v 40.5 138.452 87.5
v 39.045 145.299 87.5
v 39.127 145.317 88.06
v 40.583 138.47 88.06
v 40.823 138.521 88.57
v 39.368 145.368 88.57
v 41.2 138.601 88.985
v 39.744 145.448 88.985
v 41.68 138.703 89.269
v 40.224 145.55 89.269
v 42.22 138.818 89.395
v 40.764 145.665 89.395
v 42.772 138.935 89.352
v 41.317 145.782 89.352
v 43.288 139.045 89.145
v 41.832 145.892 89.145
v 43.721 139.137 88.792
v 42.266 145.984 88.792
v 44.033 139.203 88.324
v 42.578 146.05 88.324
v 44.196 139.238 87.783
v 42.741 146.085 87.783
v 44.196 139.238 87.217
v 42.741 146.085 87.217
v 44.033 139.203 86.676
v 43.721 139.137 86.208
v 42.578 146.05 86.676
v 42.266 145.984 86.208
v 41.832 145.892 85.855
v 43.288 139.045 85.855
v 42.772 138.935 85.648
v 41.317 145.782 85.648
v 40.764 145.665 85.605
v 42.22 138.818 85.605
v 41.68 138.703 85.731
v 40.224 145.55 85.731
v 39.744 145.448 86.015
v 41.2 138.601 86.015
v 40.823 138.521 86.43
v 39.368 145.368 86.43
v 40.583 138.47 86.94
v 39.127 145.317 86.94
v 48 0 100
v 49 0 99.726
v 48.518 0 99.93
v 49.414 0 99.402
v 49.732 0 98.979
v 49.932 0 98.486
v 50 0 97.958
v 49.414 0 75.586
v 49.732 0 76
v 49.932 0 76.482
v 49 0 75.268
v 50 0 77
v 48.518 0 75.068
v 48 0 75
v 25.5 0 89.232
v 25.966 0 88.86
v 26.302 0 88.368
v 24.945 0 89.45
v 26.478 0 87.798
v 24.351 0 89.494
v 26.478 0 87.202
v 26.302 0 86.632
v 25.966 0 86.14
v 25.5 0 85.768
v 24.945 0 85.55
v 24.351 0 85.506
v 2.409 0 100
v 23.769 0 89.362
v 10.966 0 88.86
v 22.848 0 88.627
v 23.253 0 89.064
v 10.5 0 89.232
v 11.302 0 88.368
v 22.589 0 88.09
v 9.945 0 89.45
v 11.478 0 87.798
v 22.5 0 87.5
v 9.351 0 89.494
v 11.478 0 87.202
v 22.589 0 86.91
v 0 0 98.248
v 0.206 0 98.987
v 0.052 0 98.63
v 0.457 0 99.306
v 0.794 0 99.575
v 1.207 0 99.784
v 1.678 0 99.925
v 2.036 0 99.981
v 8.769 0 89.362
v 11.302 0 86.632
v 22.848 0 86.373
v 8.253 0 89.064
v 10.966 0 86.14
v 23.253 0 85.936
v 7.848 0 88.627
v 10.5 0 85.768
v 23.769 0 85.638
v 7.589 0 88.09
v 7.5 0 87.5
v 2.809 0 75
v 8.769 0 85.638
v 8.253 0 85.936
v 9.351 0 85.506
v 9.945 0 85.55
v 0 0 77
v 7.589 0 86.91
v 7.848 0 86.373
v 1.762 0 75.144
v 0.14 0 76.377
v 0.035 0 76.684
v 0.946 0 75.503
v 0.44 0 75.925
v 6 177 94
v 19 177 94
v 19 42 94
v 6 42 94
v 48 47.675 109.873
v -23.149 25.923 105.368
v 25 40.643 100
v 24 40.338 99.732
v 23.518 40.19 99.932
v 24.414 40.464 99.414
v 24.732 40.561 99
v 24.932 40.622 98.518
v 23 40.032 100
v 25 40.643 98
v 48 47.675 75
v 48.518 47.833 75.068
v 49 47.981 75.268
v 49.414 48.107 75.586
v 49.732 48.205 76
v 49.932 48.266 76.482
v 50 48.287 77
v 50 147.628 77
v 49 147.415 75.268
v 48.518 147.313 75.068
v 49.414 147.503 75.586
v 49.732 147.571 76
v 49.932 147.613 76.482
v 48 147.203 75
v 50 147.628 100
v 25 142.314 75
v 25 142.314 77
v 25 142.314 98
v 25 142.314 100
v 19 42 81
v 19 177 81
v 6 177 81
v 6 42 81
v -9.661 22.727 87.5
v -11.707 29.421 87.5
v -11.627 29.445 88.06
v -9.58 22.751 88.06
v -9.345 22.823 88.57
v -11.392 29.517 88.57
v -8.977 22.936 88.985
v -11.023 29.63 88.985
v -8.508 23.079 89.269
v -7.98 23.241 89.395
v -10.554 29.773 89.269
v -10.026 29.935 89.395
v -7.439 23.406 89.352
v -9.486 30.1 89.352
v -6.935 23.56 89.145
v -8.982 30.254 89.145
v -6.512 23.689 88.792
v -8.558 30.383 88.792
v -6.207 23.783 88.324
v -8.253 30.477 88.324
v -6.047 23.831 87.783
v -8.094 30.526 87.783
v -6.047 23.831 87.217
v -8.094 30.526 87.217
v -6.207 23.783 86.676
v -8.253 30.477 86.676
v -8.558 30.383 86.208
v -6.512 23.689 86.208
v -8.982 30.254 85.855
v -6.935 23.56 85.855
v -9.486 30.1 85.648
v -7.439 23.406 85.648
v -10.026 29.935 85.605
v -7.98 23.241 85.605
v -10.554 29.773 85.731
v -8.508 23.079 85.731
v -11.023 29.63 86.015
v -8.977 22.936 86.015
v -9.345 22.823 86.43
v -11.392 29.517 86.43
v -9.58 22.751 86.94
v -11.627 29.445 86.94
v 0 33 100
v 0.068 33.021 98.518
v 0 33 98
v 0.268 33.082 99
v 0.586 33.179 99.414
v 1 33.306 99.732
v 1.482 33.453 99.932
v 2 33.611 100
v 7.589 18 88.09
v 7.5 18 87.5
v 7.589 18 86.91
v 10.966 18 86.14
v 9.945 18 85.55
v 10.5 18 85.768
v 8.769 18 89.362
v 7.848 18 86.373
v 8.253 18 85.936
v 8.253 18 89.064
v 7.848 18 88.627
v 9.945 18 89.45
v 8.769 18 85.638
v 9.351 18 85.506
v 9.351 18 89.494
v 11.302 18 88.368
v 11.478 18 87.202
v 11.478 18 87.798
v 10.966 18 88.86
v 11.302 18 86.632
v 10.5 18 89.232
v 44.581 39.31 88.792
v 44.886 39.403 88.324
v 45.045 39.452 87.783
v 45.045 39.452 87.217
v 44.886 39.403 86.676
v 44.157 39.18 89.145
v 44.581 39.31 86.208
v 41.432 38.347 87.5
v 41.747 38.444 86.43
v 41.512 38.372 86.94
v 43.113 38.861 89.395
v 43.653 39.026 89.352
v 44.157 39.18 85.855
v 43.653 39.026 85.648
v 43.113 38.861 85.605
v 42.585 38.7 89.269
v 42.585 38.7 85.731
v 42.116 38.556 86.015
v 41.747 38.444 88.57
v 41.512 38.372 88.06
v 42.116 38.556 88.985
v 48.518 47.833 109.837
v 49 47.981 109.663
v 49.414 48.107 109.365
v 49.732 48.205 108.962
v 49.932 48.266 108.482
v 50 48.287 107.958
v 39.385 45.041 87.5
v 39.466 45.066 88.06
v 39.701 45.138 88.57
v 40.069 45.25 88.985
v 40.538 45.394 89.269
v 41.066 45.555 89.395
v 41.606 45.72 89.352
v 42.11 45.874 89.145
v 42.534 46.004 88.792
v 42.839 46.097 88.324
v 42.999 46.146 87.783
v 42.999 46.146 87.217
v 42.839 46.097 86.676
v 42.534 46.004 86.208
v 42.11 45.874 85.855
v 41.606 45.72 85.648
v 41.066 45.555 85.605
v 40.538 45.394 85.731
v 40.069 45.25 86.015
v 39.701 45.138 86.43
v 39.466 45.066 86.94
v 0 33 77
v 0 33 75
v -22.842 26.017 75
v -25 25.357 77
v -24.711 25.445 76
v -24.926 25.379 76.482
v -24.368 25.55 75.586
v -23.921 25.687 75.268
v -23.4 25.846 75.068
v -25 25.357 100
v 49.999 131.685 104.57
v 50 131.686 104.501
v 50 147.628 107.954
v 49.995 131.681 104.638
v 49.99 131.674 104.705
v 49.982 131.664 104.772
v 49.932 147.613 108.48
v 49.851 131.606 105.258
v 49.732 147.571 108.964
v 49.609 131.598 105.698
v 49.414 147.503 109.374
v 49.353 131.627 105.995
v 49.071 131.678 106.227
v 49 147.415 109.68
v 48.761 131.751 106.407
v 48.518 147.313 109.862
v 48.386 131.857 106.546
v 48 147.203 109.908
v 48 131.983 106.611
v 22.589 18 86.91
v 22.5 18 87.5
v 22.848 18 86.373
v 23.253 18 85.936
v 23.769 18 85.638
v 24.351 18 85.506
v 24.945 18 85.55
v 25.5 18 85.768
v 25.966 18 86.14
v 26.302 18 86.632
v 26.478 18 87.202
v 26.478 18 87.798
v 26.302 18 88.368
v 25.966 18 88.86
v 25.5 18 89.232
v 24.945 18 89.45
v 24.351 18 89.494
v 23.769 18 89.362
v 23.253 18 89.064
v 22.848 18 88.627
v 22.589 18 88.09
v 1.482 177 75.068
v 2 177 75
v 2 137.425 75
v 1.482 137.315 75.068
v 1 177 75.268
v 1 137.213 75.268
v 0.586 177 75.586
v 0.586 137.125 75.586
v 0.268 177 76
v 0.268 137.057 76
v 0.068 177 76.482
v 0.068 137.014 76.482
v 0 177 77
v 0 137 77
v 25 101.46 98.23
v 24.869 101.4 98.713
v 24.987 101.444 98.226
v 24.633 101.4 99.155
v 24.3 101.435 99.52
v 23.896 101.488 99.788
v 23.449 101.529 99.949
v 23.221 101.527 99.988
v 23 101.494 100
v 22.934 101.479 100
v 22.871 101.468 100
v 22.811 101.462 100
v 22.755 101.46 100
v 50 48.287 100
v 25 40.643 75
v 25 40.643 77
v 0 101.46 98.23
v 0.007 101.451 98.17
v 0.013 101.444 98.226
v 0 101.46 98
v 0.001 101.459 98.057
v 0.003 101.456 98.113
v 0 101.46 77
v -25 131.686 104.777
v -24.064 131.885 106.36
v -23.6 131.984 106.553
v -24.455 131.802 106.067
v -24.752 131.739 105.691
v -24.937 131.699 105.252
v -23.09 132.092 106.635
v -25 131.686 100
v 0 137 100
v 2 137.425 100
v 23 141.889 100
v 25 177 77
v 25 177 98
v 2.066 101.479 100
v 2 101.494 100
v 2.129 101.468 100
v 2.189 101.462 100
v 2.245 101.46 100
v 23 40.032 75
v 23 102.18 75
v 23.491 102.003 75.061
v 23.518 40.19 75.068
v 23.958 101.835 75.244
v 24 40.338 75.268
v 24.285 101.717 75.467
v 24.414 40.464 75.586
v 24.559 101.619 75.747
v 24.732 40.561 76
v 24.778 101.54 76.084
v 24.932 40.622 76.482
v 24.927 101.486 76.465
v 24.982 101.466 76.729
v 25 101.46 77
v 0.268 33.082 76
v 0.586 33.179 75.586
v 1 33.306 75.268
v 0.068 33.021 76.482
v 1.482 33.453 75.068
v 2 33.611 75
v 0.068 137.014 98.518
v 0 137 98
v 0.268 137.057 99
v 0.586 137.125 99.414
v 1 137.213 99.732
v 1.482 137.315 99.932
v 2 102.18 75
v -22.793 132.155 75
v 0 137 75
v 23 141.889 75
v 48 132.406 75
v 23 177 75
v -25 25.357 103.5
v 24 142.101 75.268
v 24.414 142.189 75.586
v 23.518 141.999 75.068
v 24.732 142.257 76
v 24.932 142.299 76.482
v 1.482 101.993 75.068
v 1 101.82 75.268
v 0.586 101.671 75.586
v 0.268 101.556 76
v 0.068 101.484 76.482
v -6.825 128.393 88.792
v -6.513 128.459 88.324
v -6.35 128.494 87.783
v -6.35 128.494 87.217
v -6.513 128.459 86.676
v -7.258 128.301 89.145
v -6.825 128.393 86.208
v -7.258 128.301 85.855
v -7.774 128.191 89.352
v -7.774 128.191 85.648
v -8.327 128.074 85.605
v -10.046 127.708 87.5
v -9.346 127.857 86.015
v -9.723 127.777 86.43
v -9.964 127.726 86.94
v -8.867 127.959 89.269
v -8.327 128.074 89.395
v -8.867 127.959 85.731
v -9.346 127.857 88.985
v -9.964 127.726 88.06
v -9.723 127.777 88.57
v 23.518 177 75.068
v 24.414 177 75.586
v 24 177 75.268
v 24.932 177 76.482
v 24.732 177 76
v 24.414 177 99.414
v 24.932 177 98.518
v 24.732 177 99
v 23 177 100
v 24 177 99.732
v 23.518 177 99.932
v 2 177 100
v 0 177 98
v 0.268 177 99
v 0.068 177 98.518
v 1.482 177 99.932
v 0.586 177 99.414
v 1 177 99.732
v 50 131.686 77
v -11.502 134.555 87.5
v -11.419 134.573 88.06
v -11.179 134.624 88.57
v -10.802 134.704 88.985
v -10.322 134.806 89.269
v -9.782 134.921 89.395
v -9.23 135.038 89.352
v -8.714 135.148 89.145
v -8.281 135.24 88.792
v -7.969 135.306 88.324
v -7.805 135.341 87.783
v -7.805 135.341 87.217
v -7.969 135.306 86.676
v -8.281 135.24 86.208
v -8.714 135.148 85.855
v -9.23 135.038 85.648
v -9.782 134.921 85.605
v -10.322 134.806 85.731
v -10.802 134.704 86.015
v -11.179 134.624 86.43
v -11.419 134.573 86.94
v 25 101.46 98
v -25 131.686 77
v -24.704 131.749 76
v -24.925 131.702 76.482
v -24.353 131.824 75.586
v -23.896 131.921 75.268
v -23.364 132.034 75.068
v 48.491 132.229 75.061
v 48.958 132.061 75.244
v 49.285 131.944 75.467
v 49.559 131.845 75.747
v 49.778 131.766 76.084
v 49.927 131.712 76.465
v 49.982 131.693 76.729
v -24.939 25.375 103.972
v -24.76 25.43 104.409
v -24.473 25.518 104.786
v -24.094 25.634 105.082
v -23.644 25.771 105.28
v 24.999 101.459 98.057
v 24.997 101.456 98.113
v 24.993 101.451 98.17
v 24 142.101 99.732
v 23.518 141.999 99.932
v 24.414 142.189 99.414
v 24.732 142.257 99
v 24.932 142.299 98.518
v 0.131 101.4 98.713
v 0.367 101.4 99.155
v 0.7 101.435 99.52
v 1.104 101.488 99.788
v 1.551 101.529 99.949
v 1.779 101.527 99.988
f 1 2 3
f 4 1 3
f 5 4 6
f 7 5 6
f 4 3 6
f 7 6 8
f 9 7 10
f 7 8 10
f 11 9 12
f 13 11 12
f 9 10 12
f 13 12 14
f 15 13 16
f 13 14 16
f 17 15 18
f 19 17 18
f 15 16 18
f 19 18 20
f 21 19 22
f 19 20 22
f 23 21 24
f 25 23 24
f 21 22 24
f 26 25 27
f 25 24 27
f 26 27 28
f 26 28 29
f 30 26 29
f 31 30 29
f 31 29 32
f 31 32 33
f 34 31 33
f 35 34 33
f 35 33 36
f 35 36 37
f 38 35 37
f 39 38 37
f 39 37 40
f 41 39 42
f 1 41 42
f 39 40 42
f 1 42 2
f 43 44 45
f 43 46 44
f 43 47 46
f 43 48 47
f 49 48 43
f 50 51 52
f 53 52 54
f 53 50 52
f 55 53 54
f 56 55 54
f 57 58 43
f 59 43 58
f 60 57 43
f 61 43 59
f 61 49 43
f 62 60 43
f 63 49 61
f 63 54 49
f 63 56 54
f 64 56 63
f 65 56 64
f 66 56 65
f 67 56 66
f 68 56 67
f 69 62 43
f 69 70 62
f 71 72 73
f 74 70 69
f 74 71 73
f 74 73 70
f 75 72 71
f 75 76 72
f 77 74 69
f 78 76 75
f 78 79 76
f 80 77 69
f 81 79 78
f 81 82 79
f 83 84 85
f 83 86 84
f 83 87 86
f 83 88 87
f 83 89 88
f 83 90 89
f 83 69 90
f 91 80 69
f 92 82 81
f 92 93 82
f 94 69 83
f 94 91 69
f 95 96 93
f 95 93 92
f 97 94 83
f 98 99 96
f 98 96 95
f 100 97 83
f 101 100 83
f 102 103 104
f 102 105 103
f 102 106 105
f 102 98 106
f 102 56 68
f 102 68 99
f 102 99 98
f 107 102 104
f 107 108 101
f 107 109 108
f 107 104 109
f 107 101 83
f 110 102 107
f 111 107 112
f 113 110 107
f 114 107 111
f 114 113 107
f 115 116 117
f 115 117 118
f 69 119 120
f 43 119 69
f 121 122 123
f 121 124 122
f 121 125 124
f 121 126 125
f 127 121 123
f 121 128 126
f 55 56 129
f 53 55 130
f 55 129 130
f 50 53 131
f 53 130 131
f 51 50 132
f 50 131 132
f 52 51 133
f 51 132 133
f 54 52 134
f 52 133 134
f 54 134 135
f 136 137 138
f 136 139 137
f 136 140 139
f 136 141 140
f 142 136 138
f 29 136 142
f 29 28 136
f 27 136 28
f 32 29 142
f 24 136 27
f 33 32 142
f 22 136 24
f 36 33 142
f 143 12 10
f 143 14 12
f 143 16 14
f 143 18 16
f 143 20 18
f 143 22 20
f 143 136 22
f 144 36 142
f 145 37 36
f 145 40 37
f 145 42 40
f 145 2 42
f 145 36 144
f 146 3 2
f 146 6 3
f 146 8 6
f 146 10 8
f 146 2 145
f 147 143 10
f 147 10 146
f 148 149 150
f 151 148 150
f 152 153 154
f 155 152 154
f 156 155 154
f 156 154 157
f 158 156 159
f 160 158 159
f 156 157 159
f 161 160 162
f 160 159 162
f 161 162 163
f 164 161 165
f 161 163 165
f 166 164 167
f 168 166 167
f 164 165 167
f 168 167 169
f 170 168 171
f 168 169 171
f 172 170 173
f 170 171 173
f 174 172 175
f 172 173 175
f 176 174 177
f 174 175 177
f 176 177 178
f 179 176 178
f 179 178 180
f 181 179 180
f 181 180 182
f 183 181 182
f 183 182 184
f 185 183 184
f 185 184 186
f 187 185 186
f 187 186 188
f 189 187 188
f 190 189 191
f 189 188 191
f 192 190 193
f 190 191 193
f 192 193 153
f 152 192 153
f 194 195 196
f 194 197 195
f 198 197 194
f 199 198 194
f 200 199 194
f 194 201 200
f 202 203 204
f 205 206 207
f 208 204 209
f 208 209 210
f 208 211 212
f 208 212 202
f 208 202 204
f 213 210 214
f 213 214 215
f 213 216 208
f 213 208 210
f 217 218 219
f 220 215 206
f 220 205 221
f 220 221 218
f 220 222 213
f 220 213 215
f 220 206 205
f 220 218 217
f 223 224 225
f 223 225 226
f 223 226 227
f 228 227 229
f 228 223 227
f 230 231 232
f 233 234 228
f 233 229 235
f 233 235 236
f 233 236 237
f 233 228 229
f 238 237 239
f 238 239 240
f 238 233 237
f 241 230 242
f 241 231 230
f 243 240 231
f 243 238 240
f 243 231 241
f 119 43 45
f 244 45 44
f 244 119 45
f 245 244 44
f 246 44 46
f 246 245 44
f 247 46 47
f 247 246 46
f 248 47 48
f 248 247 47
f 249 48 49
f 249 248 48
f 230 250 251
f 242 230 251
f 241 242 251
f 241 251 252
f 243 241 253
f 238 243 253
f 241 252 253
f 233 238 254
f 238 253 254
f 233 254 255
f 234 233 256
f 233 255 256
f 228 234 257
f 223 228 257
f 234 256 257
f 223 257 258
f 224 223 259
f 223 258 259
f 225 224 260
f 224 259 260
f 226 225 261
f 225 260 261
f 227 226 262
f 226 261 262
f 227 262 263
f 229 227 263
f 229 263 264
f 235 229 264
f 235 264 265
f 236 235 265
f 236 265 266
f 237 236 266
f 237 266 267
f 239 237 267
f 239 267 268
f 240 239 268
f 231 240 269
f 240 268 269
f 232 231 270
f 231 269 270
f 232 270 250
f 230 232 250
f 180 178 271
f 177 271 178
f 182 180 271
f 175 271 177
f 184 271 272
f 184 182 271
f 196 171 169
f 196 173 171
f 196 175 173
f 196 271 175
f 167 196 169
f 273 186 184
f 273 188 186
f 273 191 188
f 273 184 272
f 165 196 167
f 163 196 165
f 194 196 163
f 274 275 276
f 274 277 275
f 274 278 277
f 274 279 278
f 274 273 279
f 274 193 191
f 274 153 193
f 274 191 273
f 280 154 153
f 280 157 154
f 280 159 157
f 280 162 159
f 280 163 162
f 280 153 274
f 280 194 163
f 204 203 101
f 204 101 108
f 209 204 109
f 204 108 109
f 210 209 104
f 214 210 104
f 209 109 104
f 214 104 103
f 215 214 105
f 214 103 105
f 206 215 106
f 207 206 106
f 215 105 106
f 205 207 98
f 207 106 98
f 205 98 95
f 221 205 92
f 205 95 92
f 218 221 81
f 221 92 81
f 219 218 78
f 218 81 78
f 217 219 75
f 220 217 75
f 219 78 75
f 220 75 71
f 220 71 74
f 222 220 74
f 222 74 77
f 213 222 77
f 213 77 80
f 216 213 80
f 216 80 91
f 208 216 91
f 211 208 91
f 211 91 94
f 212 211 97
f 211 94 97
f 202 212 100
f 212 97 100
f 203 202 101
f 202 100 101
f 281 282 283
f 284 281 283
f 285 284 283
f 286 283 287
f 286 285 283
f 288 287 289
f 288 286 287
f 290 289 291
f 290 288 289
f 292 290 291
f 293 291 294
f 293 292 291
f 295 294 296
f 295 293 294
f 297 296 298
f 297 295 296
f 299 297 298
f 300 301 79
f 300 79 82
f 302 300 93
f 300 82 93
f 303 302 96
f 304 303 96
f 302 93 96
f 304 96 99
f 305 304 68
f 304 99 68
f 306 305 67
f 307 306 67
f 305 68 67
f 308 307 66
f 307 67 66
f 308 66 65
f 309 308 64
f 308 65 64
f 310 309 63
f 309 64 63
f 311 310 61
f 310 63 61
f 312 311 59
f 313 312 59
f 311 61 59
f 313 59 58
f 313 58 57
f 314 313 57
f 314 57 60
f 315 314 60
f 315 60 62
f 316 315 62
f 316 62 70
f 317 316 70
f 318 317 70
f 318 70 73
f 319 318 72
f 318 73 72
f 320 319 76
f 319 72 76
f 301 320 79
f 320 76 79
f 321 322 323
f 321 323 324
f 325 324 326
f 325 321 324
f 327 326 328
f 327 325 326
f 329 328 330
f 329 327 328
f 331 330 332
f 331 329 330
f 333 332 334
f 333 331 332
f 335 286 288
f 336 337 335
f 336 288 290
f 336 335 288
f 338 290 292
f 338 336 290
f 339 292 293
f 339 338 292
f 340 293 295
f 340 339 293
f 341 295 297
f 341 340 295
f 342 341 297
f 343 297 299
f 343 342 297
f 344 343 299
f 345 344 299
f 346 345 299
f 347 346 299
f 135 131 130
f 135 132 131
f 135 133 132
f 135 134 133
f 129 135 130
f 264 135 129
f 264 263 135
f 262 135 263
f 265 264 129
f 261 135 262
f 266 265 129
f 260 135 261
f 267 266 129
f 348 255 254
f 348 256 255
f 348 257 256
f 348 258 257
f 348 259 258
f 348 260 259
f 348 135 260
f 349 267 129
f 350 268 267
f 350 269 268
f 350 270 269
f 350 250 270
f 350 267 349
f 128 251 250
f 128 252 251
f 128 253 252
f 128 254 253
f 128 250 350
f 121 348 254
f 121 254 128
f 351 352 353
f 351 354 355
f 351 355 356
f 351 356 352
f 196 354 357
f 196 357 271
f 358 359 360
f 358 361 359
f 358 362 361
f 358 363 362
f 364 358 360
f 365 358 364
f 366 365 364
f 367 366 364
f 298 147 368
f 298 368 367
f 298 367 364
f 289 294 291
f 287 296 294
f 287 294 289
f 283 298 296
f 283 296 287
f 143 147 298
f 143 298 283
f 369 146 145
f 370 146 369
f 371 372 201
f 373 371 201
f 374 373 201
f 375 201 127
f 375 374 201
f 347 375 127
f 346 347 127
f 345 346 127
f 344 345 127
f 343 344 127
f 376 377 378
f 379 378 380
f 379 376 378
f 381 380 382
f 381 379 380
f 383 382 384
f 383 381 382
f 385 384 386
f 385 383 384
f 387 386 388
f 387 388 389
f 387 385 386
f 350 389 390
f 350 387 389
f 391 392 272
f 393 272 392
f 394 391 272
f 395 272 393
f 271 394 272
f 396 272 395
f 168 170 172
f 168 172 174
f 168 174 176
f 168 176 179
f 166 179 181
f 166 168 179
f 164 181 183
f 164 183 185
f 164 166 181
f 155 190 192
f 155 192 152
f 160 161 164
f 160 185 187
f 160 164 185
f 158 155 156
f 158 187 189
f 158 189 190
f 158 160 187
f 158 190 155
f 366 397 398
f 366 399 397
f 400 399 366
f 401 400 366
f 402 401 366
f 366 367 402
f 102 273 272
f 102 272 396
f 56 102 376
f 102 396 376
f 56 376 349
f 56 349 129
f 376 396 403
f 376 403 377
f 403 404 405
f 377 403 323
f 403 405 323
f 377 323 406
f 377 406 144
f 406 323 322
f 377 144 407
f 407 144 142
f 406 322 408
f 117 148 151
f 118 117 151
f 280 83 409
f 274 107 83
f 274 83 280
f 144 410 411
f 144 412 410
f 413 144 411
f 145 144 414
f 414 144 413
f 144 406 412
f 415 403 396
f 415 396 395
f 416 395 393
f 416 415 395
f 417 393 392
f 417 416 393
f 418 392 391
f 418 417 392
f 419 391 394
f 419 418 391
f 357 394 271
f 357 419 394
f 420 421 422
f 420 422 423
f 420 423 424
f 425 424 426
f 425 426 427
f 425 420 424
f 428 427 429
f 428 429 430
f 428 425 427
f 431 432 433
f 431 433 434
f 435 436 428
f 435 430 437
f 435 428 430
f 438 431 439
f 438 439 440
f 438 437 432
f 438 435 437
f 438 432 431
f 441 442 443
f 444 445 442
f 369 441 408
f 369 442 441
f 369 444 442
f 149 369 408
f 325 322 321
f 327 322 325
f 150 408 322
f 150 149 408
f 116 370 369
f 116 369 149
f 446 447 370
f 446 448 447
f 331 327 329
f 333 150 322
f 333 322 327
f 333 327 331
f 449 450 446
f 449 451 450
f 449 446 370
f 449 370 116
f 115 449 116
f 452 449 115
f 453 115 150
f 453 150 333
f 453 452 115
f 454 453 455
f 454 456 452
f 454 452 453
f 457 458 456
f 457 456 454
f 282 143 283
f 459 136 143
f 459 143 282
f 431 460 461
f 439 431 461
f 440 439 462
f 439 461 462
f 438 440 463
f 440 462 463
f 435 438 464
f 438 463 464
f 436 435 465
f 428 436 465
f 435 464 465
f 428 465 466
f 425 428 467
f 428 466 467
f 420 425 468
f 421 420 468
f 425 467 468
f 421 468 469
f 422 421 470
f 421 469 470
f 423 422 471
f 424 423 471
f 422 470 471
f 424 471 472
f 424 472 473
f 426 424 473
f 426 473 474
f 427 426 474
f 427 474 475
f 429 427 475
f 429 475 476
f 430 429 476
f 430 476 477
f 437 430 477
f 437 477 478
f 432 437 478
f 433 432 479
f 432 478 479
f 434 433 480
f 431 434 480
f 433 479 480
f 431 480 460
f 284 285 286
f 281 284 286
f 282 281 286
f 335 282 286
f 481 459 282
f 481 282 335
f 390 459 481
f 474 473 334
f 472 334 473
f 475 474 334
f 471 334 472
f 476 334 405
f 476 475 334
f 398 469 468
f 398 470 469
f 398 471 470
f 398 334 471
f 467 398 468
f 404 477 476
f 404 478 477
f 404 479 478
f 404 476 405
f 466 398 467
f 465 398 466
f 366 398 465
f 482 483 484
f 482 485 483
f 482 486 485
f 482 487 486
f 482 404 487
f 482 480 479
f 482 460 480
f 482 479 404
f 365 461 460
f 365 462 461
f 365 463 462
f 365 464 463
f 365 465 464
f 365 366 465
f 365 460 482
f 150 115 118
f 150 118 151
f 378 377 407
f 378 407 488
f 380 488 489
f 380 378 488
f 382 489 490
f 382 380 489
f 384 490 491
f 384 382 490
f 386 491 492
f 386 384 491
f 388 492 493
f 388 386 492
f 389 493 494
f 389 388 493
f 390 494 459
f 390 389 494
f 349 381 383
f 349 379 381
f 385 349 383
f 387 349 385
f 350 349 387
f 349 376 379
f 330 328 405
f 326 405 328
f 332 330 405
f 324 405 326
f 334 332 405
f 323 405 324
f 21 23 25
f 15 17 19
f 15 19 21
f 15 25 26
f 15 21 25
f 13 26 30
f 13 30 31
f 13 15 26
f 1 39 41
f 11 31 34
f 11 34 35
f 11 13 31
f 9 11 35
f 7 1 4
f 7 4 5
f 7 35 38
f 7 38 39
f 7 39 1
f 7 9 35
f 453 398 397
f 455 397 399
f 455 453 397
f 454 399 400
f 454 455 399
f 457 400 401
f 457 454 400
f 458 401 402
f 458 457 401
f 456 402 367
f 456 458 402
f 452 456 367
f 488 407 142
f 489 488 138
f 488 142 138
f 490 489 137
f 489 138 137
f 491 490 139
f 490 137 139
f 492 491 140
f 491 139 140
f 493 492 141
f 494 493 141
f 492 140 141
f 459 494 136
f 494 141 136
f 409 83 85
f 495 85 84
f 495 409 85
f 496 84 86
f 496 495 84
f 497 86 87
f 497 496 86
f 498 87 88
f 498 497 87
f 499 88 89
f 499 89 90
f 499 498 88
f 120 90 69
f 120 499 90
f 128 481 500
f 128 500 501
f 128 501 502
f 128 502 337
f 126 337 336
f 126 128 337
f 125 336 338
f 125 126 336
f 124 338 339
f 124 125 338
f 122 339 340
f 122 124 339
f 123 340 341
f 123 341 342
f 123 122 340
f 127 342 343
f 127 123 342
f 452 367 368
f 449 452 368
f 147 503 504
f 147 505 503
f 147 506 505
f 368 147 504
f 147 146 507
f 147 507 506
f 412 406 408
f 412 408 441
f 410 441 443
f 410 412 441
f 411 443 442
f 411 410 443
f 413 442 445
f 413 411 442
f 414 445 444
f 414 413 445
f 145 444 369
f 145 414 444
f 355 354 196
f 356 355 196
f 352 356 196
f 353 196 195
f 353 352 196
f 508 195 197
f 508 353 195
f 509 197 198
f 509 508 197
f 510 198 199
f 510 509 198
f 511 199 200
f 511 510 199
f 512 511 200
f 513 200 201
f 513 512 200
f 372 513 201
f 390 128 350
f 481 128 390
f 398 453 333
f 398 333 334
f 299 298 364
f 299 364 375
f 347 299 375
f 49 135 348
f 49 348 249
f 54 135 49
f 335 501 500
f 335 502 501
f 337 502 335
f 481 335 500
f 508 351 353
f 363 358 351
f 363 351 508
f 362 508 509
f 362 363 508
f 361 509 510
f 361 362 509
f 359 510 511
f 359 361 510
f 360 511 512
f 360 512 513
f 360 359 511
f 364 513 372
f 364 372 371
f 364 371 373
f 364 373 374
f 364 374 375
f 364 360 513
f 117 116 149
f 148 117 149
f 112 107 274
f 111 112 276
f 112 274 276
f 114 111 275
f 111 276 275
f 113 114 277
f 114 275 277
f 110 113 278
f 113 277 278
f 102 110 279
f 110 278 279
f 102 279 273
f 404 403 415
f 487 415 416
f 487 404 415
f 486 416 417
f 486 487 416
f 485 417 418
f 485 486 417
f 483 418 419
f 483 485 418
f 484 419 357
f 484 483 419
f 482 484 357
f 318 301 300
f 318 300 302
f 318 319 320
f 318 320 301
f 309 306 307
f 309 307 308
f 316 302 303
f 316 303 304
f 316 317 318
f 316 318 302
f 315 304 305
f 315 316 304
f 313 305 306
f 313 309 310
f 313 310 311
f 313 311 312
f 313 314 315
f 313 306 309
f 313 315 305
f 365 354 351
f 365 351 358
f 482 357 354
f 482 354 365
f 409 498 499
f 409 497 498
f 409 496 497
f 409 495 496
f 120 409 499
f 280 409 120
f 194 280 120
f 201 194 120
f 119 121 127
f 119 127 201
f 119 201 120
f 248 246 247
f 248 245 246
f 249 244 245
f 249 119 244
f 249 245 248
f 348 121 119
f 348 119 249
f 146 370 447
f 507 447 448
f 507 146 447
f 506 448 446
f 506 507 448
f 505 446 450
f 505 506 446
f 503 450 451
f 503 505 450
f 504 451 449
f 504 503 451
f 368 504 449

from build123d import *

# Parameters (mm, degrees)
F0_W           = 25
F0_H           = 33
F1_DEPTH       = 25
F3_DEPTH       = 10
F5_DEPTH       = 81.7
F7_DEPTH       = 10
F9_DEPTH       = 92
F10_W          = 13
F10_H          = 13
F11_DEPTH      = 135
F14_W          = 99.2073006928
F14_H          = 199.154949747
F15_DEPTH      = 88
F16_R          = 1.9
F17_DEPTH      = 7
F18_R          = 1.9
F19_DEPTH      = 7
F21_DEPTH      = 18
F22_T1_DEPTH   = 58.2865340729
F22_T3_DEPTH   = 59.3111485648
F22_T5_DEPTH   = 45.6084808239
F22_T7_DEPTH   = 44.6581070284
F22_T9_DEPTH   = 26.3114146799
F22_T11_DEPTH  = 25.9417421253
F22_T16_DEPTH  = 70.8165659944
F22_T23_DEPTH  = 70.8165659944
F22_T29_DEPTH  = 70.8165659944
F22_T35_DEPTH  = 78.4598330308
F22_T41_DEPTH  = 78.4598330308
F22_T47_DEPTH  = 78.4598330308
F22_T54_DEPTH  = 70.8165659944
F22_T60_DEPTH  = 78.4598330308
F22_T66_DEPTH  = 49.2253281189
F22_T71_DEPTH  = 48.4985768834
F22_T77_DEPTH  = 48.4985768834
F22_T83_DEPTH  = 48.4985768834
F22_T89_DEPTH  = 49.2253281189
F22_T94_DEPTH  = 48.4985768834
F22_T100_DEPTH = 48.4985768834
F22_T106_DEPTH = 48.4985768834
F22_T112_DEPTH = 44.6860859582
F22_T117_DEPTH = 50
F22_T122_DEPTH = 44.6860859582
F22_T127_DEPTH = 50
F22_T133_DEPTH = 70.8165659944
F22_T138_DEPTH = 48.4985768834
F22_T146_DEPTH = 48.4985768834
F22_T151_DEPTH = 78.4598330308
F22_T159_DEPTH = 70.8165659944
F22_T163_DEPTH = 49.2253281189
F22_T170_DEPTH = 49.2253281189
F22_T174_DEPTH = 78.4598330308


# Not quite as in the source:
# - a fillet or chamfer that OpenCascade refuses, or shapes differently, is made with other operations: its cross-section is extruded or revolved along the edge and cut away or added


with BuildPart() as f1:
    # F0 (on Top) → F1 (new body)
    with BuildSketch(Plane.XY):
        with Locations((12.5, 16.5)):
            Rectangle(F0_W, F0_H)
        Polygon((-25, 25.3567329635), (0, 0), (0, 33), align=None)
        with Locations((37.5, 16.5)):
            Rectangle(F0_W, F0_H)
        Polygon((25, 40.6432670365), (0, 33), (25, 33), align=None)
        Polygon((0, 101.4598330308), (0, 33), (25, 40.6432670365), (25, 101.4598330308), (25, 137), (0, 137), align=None)
        Polygon((25, 40.6432670365), (25, 33), (50, 33), (50, 48.2865340729), align=None)
        Polygon((-25, 131.6860859582), (0, 101.4598330308), (0, 137), align=None)
        Polygon((25, 137), (25, 101.4598330308), (50, 131.6860859582), (50, 147.6278280835), (25, 142.3139140418), align=None)
        Polygon((25, 142.3139140418), (0, 137), (25, 137), align=None)
        Polygon((0, 177), (0, 137), (25, 142.3139140418), (25, 177), align=None)
    extrude(amount=F1_DEPTH)

    # F2 (on face) → F3 (join)
    with BuildSketch(Plane(origin=(0, 0, 0), x_dir=(1, 0, 0), z_dir=(0, 0, -1))):
        Polygon((50, -131.6860859582), (25, -101.4598330308), (0, -101.4598330308), (-25, -131.6860859582), (50, -147.6278280835), align=None)
    extrude(amount=F3_DEPTH)

    # F4 (on face) → F5 (cut, symmetric)
    with BuildSketch(Plane.YZ.offset(25)):
        Polygon((101.4598330308, -21.1370438337), (147.6278330308, -10), (101.4598330308, 0), align=None)
    extrude(amount=F5_DEPTH, both=True, mode=Mode.SUBTRACT)

    # F6 (on face) → F7 (join)
    with BuildSketch(Plane(origin=(0, 0, 0), x_dir=(1, 0, 0), z_dir=(0, 0, -1))):
        Polygon((50, -48.2865340729), (50, 0), (0, 0), (-25, -25.3567329635), align=None)
    extrude(amount=F7_DEPTH)

    # F8 (on face) → F9 (cut)
    with BuildSketch(Plane.YZ.offset(50)):
        Polygon((48.2865340729, -10), (0, 0), (0, -39.534393698), (48.2865340729, -39.534393698), align=None)
    extrude(amount=-F9_DEPTH, mode=Mode.SUBTRACT)

    # F10 (on face) → F11 (cut)
    with BuildSketch(Plane(origin=(0, 177, 0), x_dir=(-1, 0, 0), z_dir=(0, 1, 0))):
        with Locations((-12.5, 12.5)):
            Rectangle(F10_W, F10_H)
    extrude(amount=-F11_DEPTH, mode=Mode.SUBTRACT)


with BuildPart() as f13_1:
    # F13: instance of F1
    add(f1.part.mirror(Plane(origin=(16.2715907381, 80.4050719696, 50), x_dir=(1, 0, 0), z_dir=(0, 0, 1))))

    # F16 (on face) → F17 (cut)
    with BuildSketch(Plane(origin=(-27.8614600507, 131.0778638485, 0), x_dir=(-0.9781476007, -0.2079116908, 0), z_dir=(-0.2079116908, 0.9781476007, 0))):
        with Locations((-18.6253867704, 87.5)):
            Circle(F16_R)
        with BuildLine():
            ThreePointArc((-72.2009313853, 87.5), (-70.3009313853, 85.6), (-68.4009313853, 87.5))
            ThreePointArc((-68.4009313853, 87.5), (-70.3009313853, 89.4), (-72.2009313853, 87.5))
        make_face()
    extrude(amount=-F17_DEPTH, mode=Mode.SUBTRACT)

    # F18 (on face) → F19 (cut)
    with BuildSketch(Plane(origin=(-9.2266829073, 30.1791199472, 0), x_dir=(-0.956304756, -0.2923717047, 0), z_dir=(-0.2923717047, 0.956304756, 0))):
        with Locations((0.6940276563, 87.5)):
            Circle(F18_R)
        with BuildLine():
            ThreePointArc((-54.6328540802, 87.5), (-52.7328540802, 85.6), (-50.8328540802, 87.5))
            ThreePointArc((-50.8328540802, 87.5), (-52.7328540802, 89.4), (-54.6328540802, 87.5))
        make_face()
    extrude(amount=-F19_DEPTH, mode=Mode.SUBTRACT)

    # F20 (on face) → F21 (cut)
    with BuildSketch(Plane.XZ):
        with BuildLine():
            ThreePointArc((11.5, 87.5), (9.5, 89.5), (7.5, 87.5))
            Line((7.5, 87.5), (9.5, 87.5))
            Line((9.5, 87.5), (11.5, 87.5))
        make_face()
        with BuildLine():
            ThreePointArc((26.5, 87.5), (24.5, 89.5), (22.5, 87.5))
            ThreePointArc((22.5, 87.5), (24.5, 85.5), (26.5, 87.5))
        make_face()
        with BuildLine():
            Line((9.5, 87.5), (7.5, 87.5))
            ThreePointArc((7.5, 87.5), (9.5, 85.5), (11.5, 87.5))
            Line((11.5, 87.5), (9.5, 87.5))
        make_face()
    extrude(amount=-F21_DEPTH, mode=Mode.SUBTRACT)

    # F22: fillet of radius 2 on 18 edges, made by hand

    # F22_s2 → F22_t1 (cut)
    with BuildSketch(Plane.XZ.offset(-53.2865340729)):
        with BuildLine():
            ThreePointArc((48, 75), (49.4142135624, 75.5857864376), (50, 77))
            Line((50, 77), (50, 75))
            Line((50, 75), (48, 75))
        make_face()
    extrude(amount=F22_T1_DEPTH, mode=Mode.SUBTRACT)

    # F22_s4 → F22_t3 (cut)
    with BuildSketch(Plane(origin=(0, 73.0406545768, 15.1265059668), x_dir=(1, 0, 0), z_dir=(0, -0.9792214434, -0.2027938973))):
        with BuildLine():
            ThreePointArc((48, 97.9221443392), (49.4142135624, 97.3363579016), (50, 95.9221443392))
            Line((50, 95.9221443392), (50, 97.9221443392))
            Line((50, 97.9221443392), (48, 97.9221443392))
        make_face()
    extrude(amount=F22_T3_DEPTH, mode=Mode.SUBTRACT)

    # F22_s6 → F22_t5 (cut)
    with BuildSketch(Plane(origin=(-28.5103996887, 28.9172236636, 0), x_dir=(0, 0, 1), z_dir=(0.7020799377, -0.71209814, 0))):
        with BuildLine():
            ThreePointArc((77, 0), (75.5857864376, -0.5857864376), (75, -2))
            Line((75, -2), (75, 0))
            Line((75, 0), (77, 0))
        make_face()
    extrude(amount=F22_T5_DEPTH, mode=Mode.SUBTRACT)

    # F22_s8 → F22_t7 (cut)
    with BuildSketch(Plane(origin=(-38.1424676079, 38.6867346281, 8.0119096081), x_dir=(0.71209814, 0.7020799377, 0), z_dir=(0.6945676893, -0.7044786969, -0.145895478))):
        with BuildLine():
            ThreePointArc((0, 97.1971020036), (0.4884593774, 98.5067756066), (1.7152449464, 99.1767268568))
            Line((1.7152449464, 99.1767268568), (0, 98.9300009856))
            Line((0, 98.9300009856), (0, 97.1971020036))
        make_face()
    extrude(amount=F22_T7_DEPTH, mode=Mode.SUBTRACT)

    # F22_s10 → F22_t9 (cut)
    with BuildSketch(Plane(origin=(0, 142.94202974, 30.9612783183), x_dir=(1, 0, 0), z_dir=(0, 0.9773365731, 0.2116913388))):
        with BuildLine():
            ThreePointArc((50, -74.2554894164), (49.4142135624, -75.6697029788), (48, -76.2554894164))
            Line((48, -76.2554894164), (50, -76.2554894164))
            Line((50, -76.2554894164), (50, -74.2554894164))
        make_face()
    extrude(amount=F22_T9_DEPTH, mode=Mode.SUBTRACT)

    # F22_s12 → F22_t11 (cut)
    with BuildSketch(Plane.XZ.offset(-152.6278280835)):
        with BuildLine():
            ThreePointArc((48, 75), (49.4142135624, 75.5857864376), (50, 77))
            Line((50, 77), (50, 75))
            Line((50, 75), (48, 75))
        make_face()
    extrude(amount=F22_T11_DEPTH, mode=Mode.SUBTRACT)


with BuildPart() as f1_1:
    add(f1.part)

    # F14 (on offset) → F15 (cut)
    with BuildSketch(Plane.XY.offset(50)):
        with Locations((12.7710904926, 90.3895613737)):
            Rectangle(F14_W, F14_H)
    extrude(amount=-F15_DEPTH, mode=Mode.SUBTRACT)


with BuildPart() as f22_tool14:
    # F22_s15 → F22_t16 (new body)
    with BuildSketch(Plane.XZ.offset(-35.6432670365)):
        with BuildLine():
            ThreePointArc((25, 98), (24.4142135624, 99.4142135624), (23, 100))
            Line((23, 100), (25, 100))
            Line((25, 100), (25, 98))
        make_face()
    extrude(amount=-F22_T16_DEPTH)

    split(bisect_by=Plane(origin=(-9.2266829073, 30.1791199472, 0), x_dir=(0, 0, 1), z_dir=(-0.2923717047, 0.956304756, 0)), keep=Keep.TOP)

    split(bisect_by=Plane(origin=(-34.9845202296, 28.9355418232, 0), x_dir=(0, 0, 1), z_dir=(0.7705799894, -0.6373432983, 0)), keep=Keep.TOP)

    split(bisect_by=Plane(origin=(0, -16.1426266471, 74.5272787043), x_dir=(1, 0, 0), z_dir=(0, -0.2116913388, 0.9773365731)), keep=Keep.TOP)


with BuildPart() as f13_1_1:
    add(f13_1.part)

    # F22_t13: cut F22_tool14
    add(f22_tool14.part, mode=Mode.SUBTRACT)


with BuildPart() as f22_tool21:
    # F22_s22 → F22_t23 (new body)
    with BuildSketch(Plane.XZ.offset(-35.6432670365)):
        with BuildLine():
            ThreePointArc((25, 98), (24.4142135624, 99.4142135624), (23, 100))
            Line((23, 100), (25, 100))
            Line((25, 100), (25, 98))
        make_face()
    extrude(amount=-F22_T23_DEPTH)

    split(bisect_by=Plane(origin=(-34.9845202296, 28.9355418232, 0), x_dir=(0, 0, 1), z_dir=(-0.7705799894, 0.6373432983, 0)), keep=Keep.TOP)

    split(bisect_by=Plane(origin=(0, -16.1426266471, 74.5272787043), x_dir=(1, 0, 0), z_dir=(0, -0.2116913388, 0.9773365731)), keep=Keep.TOP)


with BuildPart() as f13_1_2:
    add(f13_1_1.part)

    # F22_t20: cut F22_tool21
    add(f22_tool21.part, mode=Mode.SUBTRACT)


with BuildPart() as f22_tool27:
    # F22_s28 → F22_t29 (new body)
    with BuildSketch(Plane.XZ.offset(-35.6432670365)):
        with BuildLine():
            ThreePointArc((25, 98), (24.4142135624, 99.4142135624), (23, 100))
            Line((23, 100), (25, 100))
            Line((25, 100), (25, 98))
        make_face()
    extrude(amount=-F22_T29_DEPTH)

    split(bisect_by=Plane(origin=(-34.9845202296, 28.9355418232, 0), x_dir=(0, 0, 1), z_dir=(0.7705799894, -0.6373432983, 0)), keep=Keep.TOP)

    split(bisect_by=Plane(origin=(0, -16.1426266471, 74.5272787043), x_dir=(1, 0, 0), z_dir=(0, 0.2116913388, -0.9773365731)), keep=Keep.TOP)


with BuildPart() as f13_1_3:
    add(f13_1_2.part)

    # F22_t26: cut F22_tool27
    add(f22_tool27.part, mode=Mode.SUBTRACT)


with BuildPart() as f22_tool33:
    # F22_s34 → F22_t35 (new body)
    with BuildSketch(Plane.XZ.offset(-106.4598330308)):
        with BuildLine():
            ThreePointArc((0, 98), (0.5857864376, 99.4142135624), (2, 100))
            Line((2, 100), (0, 100))
            Line((0, 100), (0, 98))
        make_face()
    extrude(amount=F22_T35_DEPTH)

    split(bisect_by=Plane(origin=(49.8293582326, 41.2136416249, 0), x_dir=(0, 0, 1), z_dir=(0.7705799894, 0.6373432983, 0)), keep=Keep.TOP)

    split(bisect_by=Plane(origin=(0, -16.1426266471, 74.5272787043), x_dir=(1, 0, 0), z_dir=(0, -0.2116913388, 0.9773365731)), keep=Keep.TOP)


with BuildPart() as f13_1_4:
    add(f13_1_3.part)

    # F22_t32: cut F22_tool33
    add(f22_tool33.part, mode=Mode.SUBTRACT)


with BuildPart() as f22_tool39:
    # F22_s40 → F22_t41 (new body)
    with BuildSketch(Plane.XZ.offset(-106.4598330308)):
        with BuildLine():
            ThreePointArc((0, 98), (0.5857864376, 99.4142135624), (2, 100))
            Line((2, 100), (0, 100))
            Line((0, 100), (0, 98))
        make_face()
    extrude(amount=F22_T41_DEPTH)

    split(bisect_by=Plane(origin=(49.8293582326, 41.2136416249, 0), x_dir=(0, 0, 1), z_dir=(-0.7705799894, -0.6373432983, 0)), keep=Keep.TOP)

    split(bisect_by=Plane(origin=(0, -16.1426266471, 74.5272787043), x_dir=(1, 0, 0), z_dir=(0, 0.2116913388, -0.9773365731)), keep=Keep.TOP)


with BuildPart() as f13_1_5:
    add(f13_1_4.part)

    # F22_t38: cut F22_tool39
    add(f22_tool39.part, mode=Mode.SUBTRACT)


with BuildPart() as f22_tool45:
    # F22_s46 → F22_t47 (new body)
    with BuildSketch(Plane.XZ.offset(-106.4598330308)):
        with BuildLine():
            ThreePointArc((0, 98), (0.5857864376, 99.4142135624), (2, 100))
            Line((2, 100), (0, 100))
            Line((0, 100), (0, 98))
        make_face()
    extrude(amount=F22_T47_DEPTH)

    split(bisect_by=Plane(origin=(-9.2266829073, 30.1791199472, 0), x_dir=(0, 0, 1), z_dir=(-0.2923717047, 0.956304756, 0)), keep=Keep.TOP)

    split(bisect_by=Plane(origin=(49.8293582326, 41.2136416249, 0), x_dir=(0, 0, 1), z_dir=(-0.7705799894, -0.6373432983, 0)), keep=Keep.TOP)

    split(bisect_by=Plane(origin=(0, -16.1426266471, 74.5272787043), x_dir=(1, 0, 0), z_dir=(0, -0.2116913388, 0.9773365731)), keep=Keep.TOP)


with BuildPart() as f13_1_6:
    add(f13_1_5.part)

    # F22_t44: cut F22_tool45
    add(f22_tool45.part, mode=Mode.SUBTRACT)


with BuildPart() as f22_tool52:
    # F22_s53 → F22_t54 (new body)
    with BuildSketch(Plane.XZ.offset(-35.6432670365)):
        with BuildLine():
            ThreePointArc((23, 75), (24.4142135624, 75.5857864376), (25, 77))
            Line((25, 77), (25, 75))
            Line((25, 75), (23, 75))
        make_face()
    extrude(amount=-F22_T54_DEPTH)

    split(bisect_by=Plane(origin=(-9.2266829073, 30.1791199472, 0), x_dir=(0, 0, 1), z_dir=(-0.2923717047, 0.956304756, 0)), keep=Keep.TOP)

    split(bisect_by=Plane(origin=(-34.9845202296, 28.9355418232, 0), x_dir=(0, 0, 1), z_dir=(0.7705799894, -0.6373432983, 0)), keep=Keep.TOP)


with BuildPart() as f13_1_7:
    add(f13_1_6.part)

    # F22_t51: cut F22_tool52
    add(f22_tool52.part, mode=Mode.SUBTRACT)


with BuildPart() as f22_tool58:
    # F22_s59 → F22_t60 (new body)
    with BuildSketch(Plane.XZ.offset(-106.4598330308)):
        with BuildLine():
            ThreePointArc((2, 75), (0.5857864376, 75.5857864376), (0, 77))
            Line((0, 77), (0, 75))
            Line((0, 75), (2, 75))
        make_face()
    extrude(amount=F22_T60_DEPTH)

    split(bisect_by=Plane(origin=(-9.2266829073, 30.1791199472, 0), x_dir=(0, 0, 1), z_dir=(-0.2923717047, 0.956304756, 0)), keep=Keep.TOP)

    split(bisect_by=Plane(origin=(49.8293582326, 41.2136416249, 0), x_dir=(0, 0, 1), z_dir=(-0.7705799894, -0.6373432983, 0)), keep=Keep.TOP)


with BuildPart() as f13_1_8:
    add(f13_1_7.part)

    # F22_t57: cut F22_tool58
    add(f22_tool58.part, mode=Mode.SUBTRACT)


with BuildPart() as f22_tool64:
    # F22_s65 → F22_t66 (new body)
    with BuildSketch(Plane(origin=(-78.016074724, 94.3253442805, 0), x_dir=(0, 0, 1), z_dir=(0.6373432983, -0.7705799894, 0))):
        with BuildLine():
            ThreePointArc((75, -66.6647446284), (75.5857864376, -65.250531066), (77, -64.6647446284))
            Line((77, -64.6647446284), (75, -64.6647446284))
            Line((75, -64.6647446284), (75, -66.6647446284))
        make_face()
    extrude(amount=F22_T66_DEPTH)

    split(bisect_by=Plane.YZ, keep=Keep.BOTTOM)


with BuildPart() as f13_1_9:
    add(f13_1_8.part)

    # F22_t63: cut F22_tool64
    add(f22_tool64.part, mode=Mode.SUBTRACT)


with BuildPart() as f22_tool69:
    # F22_s70 → F22_t71 (new body)
    with BuildSketch(Plane(origin=(-86.5725065584, 104.6704991917, 22.6716555172), x_dir=(0.7705799894, 0.6373432983, 0), z_dir=(0.6286469564, -0.7600656763, -0.1646304099))):
        with BuildLine():
            ThreePointArc((64.6647446284, 84.0181212592), (65.1581457726, 85.3334766818), (66.3949045162, 85.9998342338))
            Line((66.3949045162, 85.9998342338), (64.6647446284, 85.7642468686))
            Line((64.6647446284, 85.7642468686), (64.6647446284, 84.0181212592))
        make_face()
    extrude(amount=F22_T71_DEPTH)

    split(bisect_by=Plane.YZ, keep=Keep.BOTTOM)

    split(bisect_by=Plane.XY.offset(100), keep=Keep.TOP)


with BuildPart() as f13_1_10:
    add(f13_1_9.part)

    # F22_t68: cut F22_tool69
    add(f22_tool69.part, mode=Mode.SUBTRACT)


with BuildPart() as f22_tool75:
    # F22_s76 → F22_t77 (new body)
    with BuildSketch(Plane(origin=(-86.5725065584, 104.6704991917, 22.6716555172), x_dir=(0.7705799894, 0.6373432983, 0), z_dir=(0.6286469564, -0.7600656763, -0.1646304099))):
        with BuildLine():
            ThreePointArc((64.6647446284, 84.0181212592), (65.1581457726, 85.3334766818), (66.3949045162, 85.9998342338))
            Line((66.3949045162, 85.9998342338), (64.6647446284, 85.7642468686))
            Line((64.6647446284, 85.7642468686), (64.6647446284, 84.0181212592))
        make_face()
    extrude(amount=F22_T77_DEPTH)

    split(bisect_by=Plane.YZ, keep=Keep.TOP)

    split(bisect_by=Plane.XY.offset(100), keep=Keep.TOP)


with BuildPart() as f13_1_11:
    add(f13_1_10.part)

    # F22_t74: cut F22_tool75
    add(f22_tool75.part, mode=Mode.SUBTRACT)


with BuildPart() as f22_tool81:
    # F22_s82 → F22_t83 (new body)
    with BuildSketch(Plane(origin=(-86.5725065584, 104.6704991917, 22.6716555172), x_dir=(0.7705799894, 0.6373432983, 0), z_dir=(0.6286469564, -0.7600656763, -0.1646304099))):
        with BuildLine():
            ThreePointArc((64.6647446284, 84.0181212592), (65.1581457726, 85.3334766818), (66.3949045162, 85.9998342338))
            Line((66.3949045162, 85.9998342338), (64.6647446284, 85.7642468686))
            Line((64.6647446284, 85.7642468686), (64.6647446284, 84.0181212592))
        make_face()
    extrude(amount=F22_T83_DEPTH)

    split(bisect_by=Plane.YZ, keep=Keep.BOTTOM)

    split(bisect_by=Plane.XY.offset(100), keep=Keep.BOTTOM)


with BuildPart() as f13_1_12:
    add(f13_1_11.part)

    # F22_t80: cut F22_tool81
    add(f22_tool81.part, mode=Mode.SUBTRACT)


with BuildPart() as f22_tool87:
    # F22_s88 → F22_t89 (new body)
    with BuildSketch(Plane(origin=(56.7978037382, 68.6713912604, 0), x_dir=(0, 0, 1), z_dir=(0.6373432983, 0.7705799894, 0))):
        with BuildLine():
            ThreePointArc((75, -47.4002448925), (75.5857864376, -45.9860313302), (77, -45.4002448925))
            Line((77, -45.4002448925), (75, -45.4002448925))
            Line((75, -45.4002448925), (75, -47.4002448925))
        make_face()
    extrude(amount=F22_T89_DEPTH)

    split(bisect_by=Plane.YZ.offset(25), keep=Keep.TOP)


with BuildPart() as f13_1_13:
    add(f13_1_12.part)

    # F22_t86: cut F22_tool87
    add(f22_tool87.part, mode=Mode.SUBTRACT)


with BuildPart() as f22_tool92:
    # F22_s93 → F22_t94 (new body)
    with BuildSketch(Plane(origin=(65.9639487049, 79.7537199058, 17.2746750792), x_dir=(-0.7705799894, 0.6373432983, 0), z_dir=(0.6286469564, 0.7600656763, 0.1646304099))):
        with BuildLine():
            ThreePointArc((45.4002448925, 81.3949690485), (45.8936460368, 82.7103244711), (47.1304047803, 83.3766820231))
            Line((47.1304047803, 83.3766820231), (45.4002448925, 83.1410946579))
            Line((45.4002448925, 83.1410946579), (45.4002448925, 81.3949690485))
        make_face()
    extrude(amount=F22_T94_DEPTH)

    split(bisect_by=Plane.YZ.offset(25), keep=Keep.BOTTOM)

    split(bisect_by=Plane.XY.offset(100), keep=Keep.TOP)


with BuildPart() as f13_1_14:
    add(f13_1_13.part)

    # F22_t91: cut F22_tool92
    add(f22_tool92.part, mode=Mode.SUBTRACT)


with BuildPart() as f22_tool98:
    # F22_s99 → F22_t100 (new body)
    with BuildSketch(Plane(origin=(65.9639487049, 79.7537199058, 17.2746750792), x_dir=(-0.7705799894, 0.6373432983, 0), z_dir=(0.6286469564, 0.7600656763, 0.1646304099))):
        with BuildLine():
            ThreePointArc((45.4002448925, 81.3949690485), (45.8936460368, 82.7103244711), (47.1304047803, 83.3766820231))
            Line((47.1304047803, 83.3766820231), (45.4002448925, 83.1410946579))
            Line((45.4002448925, 83.1410946579), (45.4002448925, 81.3949690485))
        make_face()
    extrude(amount=F22_T100_DEPTH)

    split(bisect_by=Plane.YZ.offset(25), keep=Keep.TOP)

    split(bisect_by=Plane.XY.offset(100), keep=Keep.BOTTOM)


with BuildPart() as f13_1_15:
    add(f13_1_14.part)

    # F22_t97: cut F22_tool98
    add(f22_tool98.part, mode=Mode.SUBTRACT)


with BuildPart() as f22_tool104:
    # F22_s105 → F22_t106 (new body)
    with BuildSketch(Plane(origin=(65.9639487049, 79.7537199058, 17.2746750792), x_dir=(-0.7705799894, 0.6373432983, 0), z_dir=(0.6286469564, 0.7600656763, 0.1646304099))):
        with BuildLine():
            ThreePointArc((45.4002448925, 81.3949690485), (45.8936460368, 82.7103244711), (47.1304047803, 83.3766820231))
            Line((47.1304047803, 83.3766820231), (45.4002448925, 83.1410946579))
            Line((45.4002448925, 83.1410946579), (45.4002448925, 81.3949690485))
        make_face()
    extrude(amount=F22_T106_DEPTH)

    split(bisect_by=Plane.YZ.offset(25), keep=Keep.TOP)

    split(bisect_by=Plane.XY.offset(100), keep=Keep.TOP)


with BuildPart() as f13_1_16:
    add(f13_1_15.part)

    # F22_t103: cut F22_tool104
    add(f22_tool104.part, mode=Mode.SUBTRACT)


with BuildPart() as f22_tool110:
    # F22_s111 → F22_t112 (new body)
    with BuildSketch(Plane.XZ.offset(-137.3139140418)):
        with BuildLine():
            ThreePointArc((25, 98), (24.4142135624, 99.4142135624), (23, 100))
            Line((23, 100), (25, 100))
            Line((25, 100), (25, 98))
        make_face()
    extrude(amount=-F22_T112_DEPTH)

    split(bisect_by=Plane(origin=(-27.8614600507, 131.0778638485, 0), x_dir=(0, 0, 1), z_dir=(-0.2079116908, 0.9781476007, 0)), keep=Keep.TOP)


with BuildPart() as f13_1_17:
    add(f13_1_16.part)

    # F22_t109: cut F22_tool110
    add(f22_tool110.part, mode=Mode.SUBTRACT)


with BuildPart() as f22_tool115:
    # F22_s116 → F22_t117 (new body)
    with BuildSketch(Plane.XZ.offset(-182)):
        with BuildLine():
            ThreePointArc((2, 75), (0.5857864376, 75.5857864376), (0, 77))
            Line((0, 77), (0, 75))
            Line((0, 75), (2, 75))
        make_face()
    extrude(amount=F22_T117_DEPTH)

    split(bisect_by=Plane(origin=(-27.8614600507, 131.0778638485, 0), x_dir=(0, 0, 1), z_dir=(-0.2079116908, 0.9781476007, 0)), keep=Keep.TOP)


with BuildPart() as f13_1_18:
    add(f13_1_17.part)

    # F22_t114: cut F22_tool115
    add(f22_tool115.part, mode=Mode.SUBTRACT)


with BuildPart() as f22_tool120:
    # F22_s121 → F22_t122 (new body)
    with BuildSketch(Plane.XZ.offset(-137.3139140418)):
        with BuildLine():
            ThreePointArc((23, 75), (24.4142135624, 75.5857864376), (25, 77))
            Line((25, 77), (25, 75))
            Line((25, 75), (23, 75))
        make_face()
    extrude(amount=-F22_T122_DEPTH)

    split(bisect_by=Plane(origin=(-27.8614600507, 131.0778638485, 0), x_dir=(0, 0, 1), z_dir=(-0.2079116908, 0.9781476007, 0)), keep=Keep.TOP)


with BuildPart() as f13_1_19:
    add(f13_1_18.part)

    # F22_t119: cut F22_tool120
    add(f22_tool120.part, mode=Mode.SUBTRACT)


with BuildPart() as f22_tool125:
    # F22_s126 → F22_t127 (new body)
    with BuildSketch(Plane.XZ.offset(-182)):
        with BuildLine():
            ThreePointArc((0, 98), (0.5857864376, 99.4142135624), (2, 100))
            Line((2, 100), (0, 100))
            Line((0, 100), (0, 98))
        make_face()
    extrude(amount=F22_T127_DEPTH)

    split(bisect_by=Plane(origin=(-27.8614600507, 131.0778638485, 0), x_dir=(0, 0, 1), z_dir=(-0.2079116908, 0.9781476007, 0)), keep=Keep.TOP)


with BuildPart() as f13_1_20:
    add(f13_1_19.part)

    # F22_t124: cut F22_tool125
    add(f22_tool125.part, mode=Mode.SUBTRACT)


with BuildPart() as f22_tool131:
    # F22_s132 → F22_t133 (new body)
    with BuildSketch(Plane.XZ.offset(-35.6432670365)):
        with BuildLine():
            ThreePointArc((25, 98), (24.4142135624, 99.4142135624), (23, 100))
            Line((23, 100), (25, 100))
            Line((25, 100), (25, 98))
        make_face()
    extrude(amount=-F22_T133_DEPTH)

    split(bisect_by=Plane(origin=(-34.9845202296, 28.9355418232, 0), x_dir=(0, 0, 1), z_dir=(-0.7705799894, 0.6373432983, 0)), keep=Keep.TOP)

    split(bisect_by=Plane(origin=(0, -16.1426266471, 74.5272787043), x_dir=(1, 0, 0), z_dir=(0, 0.2116913388, -0.9773365731)), keep=Keep.TOP)


with BuildPart() as f22_tool136:
    # F22_s137 → F22_t138 (new body)
    with BuildSketch(Plane(origin=(65.9639487049, 79.7537199058, 17.2746750792), x_dir=(-0.7705799894, 0.6373432983, 0), z_dir=(0.6286469564, 0.7600656763, 0.1646304099))):
        with BuildLine():
            ThreePointArc((45.4002448925, 81.3949690485), (45.8936460368, 82.7103244711), (47.1304047803, 83.3766820231))
            Line((47.1304047803, 83.3766820231), (45.4002448925, 83.1410946579))
            Line((45.4002448925, 83.1410946579), (45.4002448925, 81.3949690485))
        make_face()
    extrude(amount=F22_T138_DEPTH)

    split(bisect_by=Plane.YZ.offset(25), keep=Keep.BOTTOM)

    split(bisect_by=Plane.XY.offset(100), keep=Keep.BOTTOM)


with BuildPart() as f22_tool131_1:
    add(f22_tool131.part)

    # F22_t141: intersect F22_tool136
    add(f22_tool136.part, mode=Mode.INTERSECT)


with BuildPart() as f13_1_21:
    add(f13_1_20.part)

    # F22_t129: cut F22_tool131
    add(f22_tool131_1.part, mode=Mode.SUBTRACT)


with BuildPart() as f22_tool144:
    # F22_s145 → F22_t146 (new body)
    with BuildSketch(Plane(origin=(-86.5725065584, 104.6704991917, 22.6716555172), x_dir=(0.7705799894, 0.6373432983, 0), z_dir=(0.6286469564, -0.7600656763, -0.1646304099))):
        with BuildLine():
            ThreePointArc((64.6647446284, 84.0181212592), (65.1581457726, 85.3334766818), (66.3949045162, 85.9998342338))
            Line((66.3949045162, 85.9998342338), (64.6647446284, 85.7642468686))
            Line((64.6647446284, 85.7642468686), (64.6647446284, 84.0181212592))
        make_face()
    extrude(amount=F22_T146_DEPTH)

    split(bisect_by=Plane.YZ, keep=Keep.TOP)

    split(bisect_by=Plane.XY.offset(100), keep=Keep.BOTTOM)


with BuildPart() as f22_tool149:
    # F22_s150 → F22_t151 (new body)
    with BuildSketch(Plane.XZ.offset(-106.4598330308)):
        with BuildLine():
            ThreePointArc((0, 98), (0.5857864376, 99.4142135624), (2, 100))
            Line((2, 100), (0, 100))
            Line((0, 100), (0, 98))
        make_face()
    extrude(amount=F22_T151_DEPTH)

    split(bisect_by=Plane(origin=(49.8293582326, 41.2136416249, 0), x_dir=(0, 0, 1), z_dir=(0.7705799894, 0.6373432983, 0)), keep=Keep.TOP)

    split(bisect_by=Plane(origin=(0, -16.1426266471, 74.5272787043), x_dir=(1, 0, 0), z_dir=(0, 0.2116913388, -0.9773365731)), keep=Keep.TOP)


with BuildPart() as f22_tool144_1:
    add(f22_tool144.part)

    # F22_t154: intersect F22_tool149
    add(f22_tool149.part, mode=Mode.INTERSECT)


with BuildPart() as f13_1_22:
    add(f13_1_21.part)

    # F22_t142: cut F22_tool144
    add(f22_tool144_1.part, mode=Mode.SUBTRACT)


with BuildPart() as f22_tool157:
    # F22_s158 → F22_t159 (new body)
    with BuildSketch(Plane.XZ.offset(-35.6432670365)):
        with BuildLine():
            ThreePointArc((23, 75), (24.4142135624, 75.5857864376), (25, 77))
            Line((25, 77), (25, 75))
            Line((25, 75), (23, 75))
        make_face()
    extrude(amount=-F22_T159_DEPTH)

    split(bisect_by=Plane(origin=(-34.9845202296, 28.9355418232, 0), x_dir=(0, 0, 1), z_dir=(-0.7705799894, 0.6373432983, 0)), keep=Keep.TOP)


with BuildPart() as f22_tool161:
    # F22_s162 → F22_t163 (new body)
    with BuildSketch(Plane(origin=(56.7978037382, 68.6713912604, 0), x_dir=(0, 0, 1), z_dir=(0.6373432983, 0.7705799894, 0))):
        with BuildLine():
            ThreePointArc((75, -47.4002448925), (75.5857864376, -45.9860313302), (77, -45.4002448925))
            Line((77, -45.4002448925), (75, -45.4002448925))
            Line((75, -45.4002448925), (75, -47.4002448925))
        make_face()
    extrude(amount=F22_T163_DEPTH)

    split(bisect_by=Plane.YZ.offset(25), keep=Keep.BOTTOM)


with BuildPart() as f22_tool157_1:
    add(f22_tool157.part)

    # F22_t165: intersect F22_tool161
    add(f22_tool161.part, mode=Mode.INTERSECT)


with BuildPart() as f13_1_23:
    add(f13_1_22.part)

    # F22_t155: cut F22_tool157
    add(f22_tool157_1.part, mode=Mode.SUBTRACT)


with BuildPart() as f22_tool168:
    # F22_s169 → F22_t170 (new body)
    with BuildSketch(Plane(origin=(-78.016074724, 94.3253442805, 0), x_dir=(0, 0, 1), z_dir=(0.6373432983, -0.7705799894, 0))):
        with BuildLine():
            ThreePointArc((75, -66.6647446284), (75.5857864376, -65.250531066), (77, -64.6647446284))
            Line((77, -64.6647446284), (75, -64.6647446284))
            Line((75, -64.6647446284), (75, -66.6647446284))
        make_face()
    extrude(amount=F22_T170_DEPTH)

    split(bisect_by=Plane.YZ, keep=Keep.TOP)


with BuildPart() as f22_tool172:
    # F22_s173 → F22_t174 (new body)
    with BuildSketch(Plane.XZ.offset(-106.4598330308)):
        with BuildLine():
            ThreePointArc((2, 75), (0.5857864376, 75.5857864376), (0, 77))
            Line((0, 77), (0, 75))
            Line((0, 75), (2, 75))
        make_face()
    extrude(amount=F22_T174_DEPTH)

    split(bisect_by=Plane(origin=(49.8293582326, 41.2136416249, 0), x_dir=(0, 0, 1), z_dir=(0.7705799894, 0.6373432983, 0)), keep=Keep.TOP)


with BuildPart() as f22_tool168_1:
    add(f22_tool168.part)

    # F22_t176: intersect F22_tool172
    add(f22_tool172.part, mode=Mode.INTERSECT)


with BuildPart() as f13_1_24:
    add(f13_1_23.part)

    # F22_t166: cut F22_tool168
    add(f22_tool168_1.part, mode=Mode.SUBTRACT)


solid = f13_1_24.part
